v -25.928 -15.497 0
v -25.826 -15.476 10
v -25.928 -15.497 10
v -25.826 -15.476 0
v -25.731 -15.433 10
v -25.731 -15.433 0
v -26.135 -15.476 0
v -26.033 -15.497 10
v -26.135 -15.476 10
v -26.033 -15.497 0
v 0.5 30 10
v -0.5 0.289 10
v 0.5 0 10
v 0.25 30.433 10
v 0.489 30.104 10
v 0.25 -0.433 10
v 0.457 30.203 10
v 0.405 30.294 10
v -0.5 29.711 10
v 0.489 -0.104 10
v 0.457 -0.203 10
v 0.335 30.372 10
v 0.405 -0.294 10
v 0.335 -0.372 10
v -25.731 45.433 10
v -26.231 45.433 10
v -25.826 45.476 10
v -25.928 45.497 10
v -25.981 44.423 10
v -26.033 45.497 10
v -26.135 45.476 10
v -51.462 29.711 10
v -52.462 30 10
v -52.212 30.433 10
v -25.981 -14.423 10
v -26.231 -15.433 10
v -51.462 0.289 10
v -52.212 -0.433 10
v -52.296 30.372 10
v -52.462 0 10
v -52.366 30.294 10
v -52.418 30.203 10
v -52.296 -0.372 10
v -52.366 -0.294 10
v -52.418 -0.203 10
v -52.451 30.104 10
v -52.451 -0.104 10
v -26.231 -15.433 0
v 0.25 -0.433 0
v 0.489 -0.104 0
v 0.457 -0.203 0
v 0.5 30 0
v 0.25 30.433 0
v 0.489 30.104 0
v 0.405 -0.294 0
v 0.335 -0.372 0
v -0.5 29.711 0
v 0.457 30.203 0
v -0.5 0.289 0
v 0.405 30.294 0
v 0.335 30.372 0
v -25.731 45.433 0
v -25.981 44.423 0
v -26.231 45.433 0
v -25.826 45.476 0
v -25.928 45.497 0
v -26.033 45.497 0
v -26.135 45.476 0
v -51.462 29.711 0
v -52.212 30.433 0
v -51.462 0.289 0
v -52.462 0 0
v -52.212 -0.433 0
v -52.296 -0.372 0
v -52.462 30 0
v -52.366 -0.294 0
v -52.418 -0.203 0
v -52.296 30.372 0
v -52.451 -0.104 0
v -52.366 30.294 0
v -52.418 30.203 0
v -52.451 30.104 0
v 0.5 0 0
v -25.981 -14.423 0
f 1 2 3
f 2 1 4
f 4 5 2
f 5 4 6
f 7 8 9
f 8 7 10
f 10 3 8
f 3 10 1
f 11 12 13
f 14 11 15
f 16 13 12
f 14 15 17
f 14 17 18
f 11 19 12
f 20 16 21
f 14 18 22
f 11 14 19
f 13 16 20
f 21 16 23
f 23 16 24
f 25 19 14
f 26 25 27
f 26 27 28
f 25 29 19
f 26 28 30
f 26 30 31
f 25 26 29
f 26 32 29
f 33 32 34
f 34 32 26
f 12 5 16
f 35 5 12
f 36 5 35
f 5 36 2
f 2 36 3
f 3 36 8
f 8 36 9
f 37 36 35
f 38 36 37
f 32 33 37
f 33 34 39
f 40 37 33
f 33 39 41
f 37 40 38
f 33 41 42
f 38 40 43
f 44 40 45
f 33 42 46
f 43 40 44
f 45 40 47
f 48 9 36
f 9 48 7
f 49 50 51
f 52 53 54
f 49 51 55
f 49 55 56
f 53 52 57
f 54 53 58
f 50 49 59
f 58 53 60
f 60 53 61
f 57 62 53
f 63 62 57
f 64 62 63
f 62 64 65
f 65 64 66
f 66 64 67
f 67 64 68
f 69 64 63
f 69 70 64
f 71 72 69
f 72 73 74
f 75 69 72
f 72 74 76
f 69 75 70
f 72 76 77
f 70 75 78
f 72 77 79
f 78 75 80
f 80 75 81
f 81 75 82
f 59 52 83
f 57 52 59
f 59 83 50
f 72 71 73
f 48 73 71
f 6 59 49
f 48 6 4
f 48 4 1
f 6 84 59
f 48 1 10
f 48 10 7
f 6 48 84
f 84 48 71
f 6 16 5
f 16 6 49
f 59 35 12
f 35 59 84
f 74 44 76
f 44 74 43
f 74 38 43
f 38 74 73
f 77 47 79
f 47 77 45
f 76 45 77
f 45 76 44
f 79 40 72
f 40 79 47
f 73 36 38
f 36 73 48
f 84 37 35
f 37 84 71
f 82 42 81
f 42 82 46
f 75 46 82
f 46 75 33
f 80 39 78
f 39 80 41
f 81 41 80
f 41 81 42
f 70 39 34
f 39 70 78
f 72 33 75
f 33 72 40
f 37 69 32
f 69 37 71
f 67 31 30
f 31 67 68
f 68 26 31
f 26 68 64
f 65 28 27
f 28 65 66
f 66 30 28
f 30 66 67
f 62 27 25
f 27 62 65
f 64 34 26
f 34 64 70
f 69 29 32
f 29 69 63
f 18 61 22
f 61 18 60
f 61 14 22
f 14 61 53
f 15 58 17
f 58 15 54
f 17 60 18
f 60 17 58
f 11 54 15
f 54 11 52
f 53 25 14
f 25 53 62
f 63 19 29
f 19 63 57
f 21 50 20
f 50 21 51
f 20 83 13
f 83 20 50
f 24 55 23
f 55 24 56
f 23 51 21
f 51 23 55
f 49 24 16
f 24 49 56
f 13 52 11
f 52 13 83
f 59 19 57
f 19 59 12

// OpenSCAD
module polygon(side = 30, height = 1, width = 1, sides = 5, drawn = 0) {
    angle = 360 / sides;
    if (drawn < sides) {
        
        cylinder(r = width / 2, h = height, $fn = 30);
        translate([-width / 2, 0, 0]) {
            cube([width, side, height]);
        }
        translate([0, side, 0])
            rotate([0, 0, angle])
                polygon(side = side,
                       height = height, 
                       width = width,
                       sides = sides,
                       drawn = drawn + 1);
    }
}

polygon(height = 10, sides = 6);
